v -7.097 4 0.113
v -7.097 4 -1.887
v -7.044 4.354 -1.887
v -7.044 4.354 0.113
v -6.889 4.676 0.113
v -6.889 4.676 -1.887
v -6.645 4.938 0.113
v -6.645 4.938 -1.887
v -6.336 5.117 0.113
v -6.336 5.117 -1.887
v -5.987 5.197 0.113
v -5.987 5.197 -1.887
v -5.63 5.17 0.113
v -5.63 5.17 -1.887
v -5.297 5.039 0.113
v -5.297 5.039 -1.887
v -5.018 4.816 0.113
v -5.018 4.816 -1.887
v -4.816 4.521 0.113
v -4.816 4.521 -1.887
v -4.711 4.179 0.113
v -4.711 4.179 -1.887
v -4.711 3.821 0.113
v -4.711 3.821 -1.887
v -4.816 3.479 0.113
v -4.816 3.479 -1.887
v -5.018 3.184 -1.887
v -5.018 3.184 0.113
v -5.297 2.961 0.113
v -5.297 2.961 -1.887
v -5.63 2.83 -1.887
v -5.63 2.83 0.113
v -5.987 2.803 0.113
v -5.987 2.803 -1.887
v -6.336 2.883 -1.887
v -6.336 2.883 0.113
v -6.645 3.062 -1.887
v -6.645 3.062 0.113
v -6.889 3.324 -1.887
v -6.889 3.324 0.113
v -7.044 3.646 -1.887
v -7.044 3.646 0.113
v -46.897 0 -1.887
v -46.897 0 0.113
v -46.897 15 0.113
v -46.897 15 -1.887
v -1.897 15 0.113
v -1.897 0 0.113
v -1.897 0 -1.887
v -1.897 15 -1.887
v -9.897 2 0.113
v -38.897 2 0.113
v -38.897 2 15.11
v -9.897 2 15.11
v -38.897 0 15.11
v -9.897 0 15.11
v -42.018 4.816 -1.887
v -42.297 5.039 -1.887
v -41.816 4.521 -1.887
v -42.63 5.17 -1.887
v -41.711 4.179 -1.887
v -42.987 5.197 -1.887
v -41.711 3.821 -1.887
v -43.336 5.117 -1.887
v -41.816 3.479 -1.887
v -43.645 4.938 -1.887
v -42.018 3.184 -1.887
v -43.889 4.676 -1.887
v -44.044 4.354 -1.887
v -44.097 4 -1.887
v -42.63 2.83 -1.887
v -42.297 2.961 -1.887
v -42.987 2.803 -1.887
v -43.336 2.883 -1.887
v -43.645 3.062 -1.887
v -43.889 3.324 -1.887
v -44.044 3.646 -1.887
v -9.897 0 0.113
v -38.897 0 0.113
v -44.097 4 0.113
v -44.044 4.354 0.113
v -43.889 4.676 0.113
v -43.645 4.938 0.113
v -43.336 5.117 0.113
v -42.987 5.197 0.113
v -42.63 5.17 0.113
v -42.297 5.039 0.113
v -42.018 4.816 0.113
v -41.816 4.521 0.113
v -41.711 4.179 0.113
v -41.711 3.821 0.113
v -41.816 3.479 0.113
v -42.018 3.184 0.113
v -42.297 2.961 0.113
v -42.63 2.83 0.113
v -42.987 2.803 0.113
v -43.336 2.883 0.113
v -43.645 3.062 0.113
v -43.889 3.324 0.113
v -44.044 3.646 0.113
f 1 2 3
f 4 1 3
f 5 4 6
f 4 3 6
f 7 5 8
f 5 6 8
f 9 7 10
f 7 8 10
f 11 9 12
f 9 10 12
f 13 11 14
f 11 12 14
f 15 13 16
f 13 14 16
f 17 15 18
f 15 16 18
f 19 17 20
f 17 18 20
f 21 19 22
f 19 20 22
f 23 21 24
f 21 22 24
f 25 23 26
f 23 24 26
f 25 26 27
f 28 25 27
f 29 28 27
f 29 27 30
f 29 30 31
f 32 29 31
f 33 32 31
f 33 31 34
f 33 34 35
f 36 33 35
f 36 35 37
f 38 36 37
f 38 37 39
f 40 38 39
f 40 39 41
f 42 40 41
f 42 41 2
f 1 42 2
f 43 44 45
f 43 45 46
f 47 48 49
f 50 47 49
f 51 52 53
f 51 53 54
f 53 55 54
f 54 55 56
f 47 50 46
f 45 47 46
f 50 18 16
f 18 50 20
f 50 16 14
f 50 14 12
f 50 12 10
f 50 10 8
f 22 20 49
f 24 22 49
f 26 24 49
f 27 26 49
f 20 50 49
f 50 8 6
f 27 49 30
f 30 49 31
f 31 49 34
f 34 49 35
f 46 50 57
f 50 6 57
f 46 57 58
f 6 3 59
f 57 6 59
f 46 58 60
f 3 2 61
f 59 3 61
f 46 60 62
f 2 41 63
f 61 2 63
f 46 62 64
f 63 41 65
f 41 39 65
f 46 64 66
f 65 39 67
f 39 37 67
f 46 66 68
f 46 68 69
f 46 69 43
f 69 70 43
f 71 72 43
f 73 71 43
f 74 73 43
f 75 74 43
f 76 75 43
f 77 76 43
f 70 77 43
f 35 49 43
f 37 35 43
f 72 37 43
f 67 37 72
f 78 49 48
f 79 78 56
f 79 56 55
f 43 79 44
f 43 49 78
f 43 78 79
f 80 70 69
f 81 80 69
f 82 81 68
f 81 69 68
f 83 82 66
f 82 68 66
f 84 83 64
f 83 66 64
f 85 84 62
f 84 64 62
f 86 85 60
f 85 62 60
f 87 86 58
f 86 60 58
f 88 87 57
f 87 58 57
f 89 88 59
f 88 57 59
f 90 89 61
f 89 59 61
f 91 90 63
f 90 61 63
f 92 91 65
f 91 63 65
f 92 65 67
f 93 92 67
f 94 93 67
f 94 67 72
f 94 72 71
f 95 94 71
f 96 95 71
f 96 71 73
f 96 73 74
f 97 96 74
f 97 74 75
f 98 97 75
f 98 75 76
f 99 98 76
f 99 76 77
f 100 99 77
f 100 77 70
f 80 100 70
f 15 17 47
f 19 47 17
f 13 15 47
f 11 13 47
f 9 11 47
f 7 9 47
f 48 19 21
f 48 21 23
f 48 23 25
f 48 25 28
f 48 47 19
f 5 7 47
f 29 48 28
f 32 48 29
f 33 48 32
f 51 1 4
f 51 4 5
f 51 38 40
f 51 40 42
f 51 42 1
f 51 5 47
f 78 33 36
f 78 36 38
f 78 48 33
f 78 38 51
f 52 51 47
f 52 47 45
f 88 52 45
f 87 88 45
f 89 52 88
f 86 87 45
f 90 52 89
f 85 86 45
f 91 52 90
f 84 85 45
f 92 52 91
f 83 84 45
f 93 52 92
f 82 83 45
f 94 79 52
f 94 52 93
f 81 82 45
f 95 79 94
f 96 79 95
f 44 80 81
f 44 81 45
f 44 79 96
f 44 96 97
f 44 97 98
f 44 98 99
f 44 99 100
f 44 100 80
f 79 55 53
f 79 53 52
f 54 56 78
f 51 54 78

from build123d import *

# Parameters (mm, degrees)
SKETCH2_W            = 29
SKETCH2_H            = 15.11
BOSS_EXTRUDE1_DEPTH  = 2
SKETCH7_W            = 45
SKETCH7_H            = 2
BOSS_EXTRUDE2_DEPTH  = 15
M2_CLEARANCE_HOLE1_D = 2.4
M2_CLEARANCE_HOLE2_D = 2.4


with BuildPart() as part:
    # Sketch2 → Boss-Extrude1 (new body)
    with BuildSketch(Plane(origin=(0, 0, 0), x_dir=(1, 0, 0), z_dir=(0, 1, 0))):
        with Locations((-24.397211382, -7.555)):
            Rectangle(SKETCH2_W, SKETCH2_H)
    extrude(amount=BOSS_EXTRUDE1_DEPTH)

    # Sketch7 → Boss-Extrude2 (add)
    with BuildSketch(Plane(origin=(0, 0, 0), x_dir=(-1, 0, 0), z_dir=(0, -1, 0))):
        with Locations((24.397211382, 0.886680676)):
            Rectangle(SKETCH7_W, SKETCH7_H)
    extrude(amount=-BOSS_EXTRUDE2_DEPTH)

    # M2 Clearance Hole1 (through all)
    with Locations(Plane.XY.offset(0.113319324)):
        with Locations((-42.897211382, 4)):
            Hole(M2_CLEARANCE_HOLE1_D / 2)

    # M2 Clearance Hole2 (through all)
    with Locations(Plane.XY.offset(0.113319324)):
        with Locations((-5.897211382, 4)):
            Hole(M2_CLEARANCE_HOLE2_D / 2)


solid = part.part
